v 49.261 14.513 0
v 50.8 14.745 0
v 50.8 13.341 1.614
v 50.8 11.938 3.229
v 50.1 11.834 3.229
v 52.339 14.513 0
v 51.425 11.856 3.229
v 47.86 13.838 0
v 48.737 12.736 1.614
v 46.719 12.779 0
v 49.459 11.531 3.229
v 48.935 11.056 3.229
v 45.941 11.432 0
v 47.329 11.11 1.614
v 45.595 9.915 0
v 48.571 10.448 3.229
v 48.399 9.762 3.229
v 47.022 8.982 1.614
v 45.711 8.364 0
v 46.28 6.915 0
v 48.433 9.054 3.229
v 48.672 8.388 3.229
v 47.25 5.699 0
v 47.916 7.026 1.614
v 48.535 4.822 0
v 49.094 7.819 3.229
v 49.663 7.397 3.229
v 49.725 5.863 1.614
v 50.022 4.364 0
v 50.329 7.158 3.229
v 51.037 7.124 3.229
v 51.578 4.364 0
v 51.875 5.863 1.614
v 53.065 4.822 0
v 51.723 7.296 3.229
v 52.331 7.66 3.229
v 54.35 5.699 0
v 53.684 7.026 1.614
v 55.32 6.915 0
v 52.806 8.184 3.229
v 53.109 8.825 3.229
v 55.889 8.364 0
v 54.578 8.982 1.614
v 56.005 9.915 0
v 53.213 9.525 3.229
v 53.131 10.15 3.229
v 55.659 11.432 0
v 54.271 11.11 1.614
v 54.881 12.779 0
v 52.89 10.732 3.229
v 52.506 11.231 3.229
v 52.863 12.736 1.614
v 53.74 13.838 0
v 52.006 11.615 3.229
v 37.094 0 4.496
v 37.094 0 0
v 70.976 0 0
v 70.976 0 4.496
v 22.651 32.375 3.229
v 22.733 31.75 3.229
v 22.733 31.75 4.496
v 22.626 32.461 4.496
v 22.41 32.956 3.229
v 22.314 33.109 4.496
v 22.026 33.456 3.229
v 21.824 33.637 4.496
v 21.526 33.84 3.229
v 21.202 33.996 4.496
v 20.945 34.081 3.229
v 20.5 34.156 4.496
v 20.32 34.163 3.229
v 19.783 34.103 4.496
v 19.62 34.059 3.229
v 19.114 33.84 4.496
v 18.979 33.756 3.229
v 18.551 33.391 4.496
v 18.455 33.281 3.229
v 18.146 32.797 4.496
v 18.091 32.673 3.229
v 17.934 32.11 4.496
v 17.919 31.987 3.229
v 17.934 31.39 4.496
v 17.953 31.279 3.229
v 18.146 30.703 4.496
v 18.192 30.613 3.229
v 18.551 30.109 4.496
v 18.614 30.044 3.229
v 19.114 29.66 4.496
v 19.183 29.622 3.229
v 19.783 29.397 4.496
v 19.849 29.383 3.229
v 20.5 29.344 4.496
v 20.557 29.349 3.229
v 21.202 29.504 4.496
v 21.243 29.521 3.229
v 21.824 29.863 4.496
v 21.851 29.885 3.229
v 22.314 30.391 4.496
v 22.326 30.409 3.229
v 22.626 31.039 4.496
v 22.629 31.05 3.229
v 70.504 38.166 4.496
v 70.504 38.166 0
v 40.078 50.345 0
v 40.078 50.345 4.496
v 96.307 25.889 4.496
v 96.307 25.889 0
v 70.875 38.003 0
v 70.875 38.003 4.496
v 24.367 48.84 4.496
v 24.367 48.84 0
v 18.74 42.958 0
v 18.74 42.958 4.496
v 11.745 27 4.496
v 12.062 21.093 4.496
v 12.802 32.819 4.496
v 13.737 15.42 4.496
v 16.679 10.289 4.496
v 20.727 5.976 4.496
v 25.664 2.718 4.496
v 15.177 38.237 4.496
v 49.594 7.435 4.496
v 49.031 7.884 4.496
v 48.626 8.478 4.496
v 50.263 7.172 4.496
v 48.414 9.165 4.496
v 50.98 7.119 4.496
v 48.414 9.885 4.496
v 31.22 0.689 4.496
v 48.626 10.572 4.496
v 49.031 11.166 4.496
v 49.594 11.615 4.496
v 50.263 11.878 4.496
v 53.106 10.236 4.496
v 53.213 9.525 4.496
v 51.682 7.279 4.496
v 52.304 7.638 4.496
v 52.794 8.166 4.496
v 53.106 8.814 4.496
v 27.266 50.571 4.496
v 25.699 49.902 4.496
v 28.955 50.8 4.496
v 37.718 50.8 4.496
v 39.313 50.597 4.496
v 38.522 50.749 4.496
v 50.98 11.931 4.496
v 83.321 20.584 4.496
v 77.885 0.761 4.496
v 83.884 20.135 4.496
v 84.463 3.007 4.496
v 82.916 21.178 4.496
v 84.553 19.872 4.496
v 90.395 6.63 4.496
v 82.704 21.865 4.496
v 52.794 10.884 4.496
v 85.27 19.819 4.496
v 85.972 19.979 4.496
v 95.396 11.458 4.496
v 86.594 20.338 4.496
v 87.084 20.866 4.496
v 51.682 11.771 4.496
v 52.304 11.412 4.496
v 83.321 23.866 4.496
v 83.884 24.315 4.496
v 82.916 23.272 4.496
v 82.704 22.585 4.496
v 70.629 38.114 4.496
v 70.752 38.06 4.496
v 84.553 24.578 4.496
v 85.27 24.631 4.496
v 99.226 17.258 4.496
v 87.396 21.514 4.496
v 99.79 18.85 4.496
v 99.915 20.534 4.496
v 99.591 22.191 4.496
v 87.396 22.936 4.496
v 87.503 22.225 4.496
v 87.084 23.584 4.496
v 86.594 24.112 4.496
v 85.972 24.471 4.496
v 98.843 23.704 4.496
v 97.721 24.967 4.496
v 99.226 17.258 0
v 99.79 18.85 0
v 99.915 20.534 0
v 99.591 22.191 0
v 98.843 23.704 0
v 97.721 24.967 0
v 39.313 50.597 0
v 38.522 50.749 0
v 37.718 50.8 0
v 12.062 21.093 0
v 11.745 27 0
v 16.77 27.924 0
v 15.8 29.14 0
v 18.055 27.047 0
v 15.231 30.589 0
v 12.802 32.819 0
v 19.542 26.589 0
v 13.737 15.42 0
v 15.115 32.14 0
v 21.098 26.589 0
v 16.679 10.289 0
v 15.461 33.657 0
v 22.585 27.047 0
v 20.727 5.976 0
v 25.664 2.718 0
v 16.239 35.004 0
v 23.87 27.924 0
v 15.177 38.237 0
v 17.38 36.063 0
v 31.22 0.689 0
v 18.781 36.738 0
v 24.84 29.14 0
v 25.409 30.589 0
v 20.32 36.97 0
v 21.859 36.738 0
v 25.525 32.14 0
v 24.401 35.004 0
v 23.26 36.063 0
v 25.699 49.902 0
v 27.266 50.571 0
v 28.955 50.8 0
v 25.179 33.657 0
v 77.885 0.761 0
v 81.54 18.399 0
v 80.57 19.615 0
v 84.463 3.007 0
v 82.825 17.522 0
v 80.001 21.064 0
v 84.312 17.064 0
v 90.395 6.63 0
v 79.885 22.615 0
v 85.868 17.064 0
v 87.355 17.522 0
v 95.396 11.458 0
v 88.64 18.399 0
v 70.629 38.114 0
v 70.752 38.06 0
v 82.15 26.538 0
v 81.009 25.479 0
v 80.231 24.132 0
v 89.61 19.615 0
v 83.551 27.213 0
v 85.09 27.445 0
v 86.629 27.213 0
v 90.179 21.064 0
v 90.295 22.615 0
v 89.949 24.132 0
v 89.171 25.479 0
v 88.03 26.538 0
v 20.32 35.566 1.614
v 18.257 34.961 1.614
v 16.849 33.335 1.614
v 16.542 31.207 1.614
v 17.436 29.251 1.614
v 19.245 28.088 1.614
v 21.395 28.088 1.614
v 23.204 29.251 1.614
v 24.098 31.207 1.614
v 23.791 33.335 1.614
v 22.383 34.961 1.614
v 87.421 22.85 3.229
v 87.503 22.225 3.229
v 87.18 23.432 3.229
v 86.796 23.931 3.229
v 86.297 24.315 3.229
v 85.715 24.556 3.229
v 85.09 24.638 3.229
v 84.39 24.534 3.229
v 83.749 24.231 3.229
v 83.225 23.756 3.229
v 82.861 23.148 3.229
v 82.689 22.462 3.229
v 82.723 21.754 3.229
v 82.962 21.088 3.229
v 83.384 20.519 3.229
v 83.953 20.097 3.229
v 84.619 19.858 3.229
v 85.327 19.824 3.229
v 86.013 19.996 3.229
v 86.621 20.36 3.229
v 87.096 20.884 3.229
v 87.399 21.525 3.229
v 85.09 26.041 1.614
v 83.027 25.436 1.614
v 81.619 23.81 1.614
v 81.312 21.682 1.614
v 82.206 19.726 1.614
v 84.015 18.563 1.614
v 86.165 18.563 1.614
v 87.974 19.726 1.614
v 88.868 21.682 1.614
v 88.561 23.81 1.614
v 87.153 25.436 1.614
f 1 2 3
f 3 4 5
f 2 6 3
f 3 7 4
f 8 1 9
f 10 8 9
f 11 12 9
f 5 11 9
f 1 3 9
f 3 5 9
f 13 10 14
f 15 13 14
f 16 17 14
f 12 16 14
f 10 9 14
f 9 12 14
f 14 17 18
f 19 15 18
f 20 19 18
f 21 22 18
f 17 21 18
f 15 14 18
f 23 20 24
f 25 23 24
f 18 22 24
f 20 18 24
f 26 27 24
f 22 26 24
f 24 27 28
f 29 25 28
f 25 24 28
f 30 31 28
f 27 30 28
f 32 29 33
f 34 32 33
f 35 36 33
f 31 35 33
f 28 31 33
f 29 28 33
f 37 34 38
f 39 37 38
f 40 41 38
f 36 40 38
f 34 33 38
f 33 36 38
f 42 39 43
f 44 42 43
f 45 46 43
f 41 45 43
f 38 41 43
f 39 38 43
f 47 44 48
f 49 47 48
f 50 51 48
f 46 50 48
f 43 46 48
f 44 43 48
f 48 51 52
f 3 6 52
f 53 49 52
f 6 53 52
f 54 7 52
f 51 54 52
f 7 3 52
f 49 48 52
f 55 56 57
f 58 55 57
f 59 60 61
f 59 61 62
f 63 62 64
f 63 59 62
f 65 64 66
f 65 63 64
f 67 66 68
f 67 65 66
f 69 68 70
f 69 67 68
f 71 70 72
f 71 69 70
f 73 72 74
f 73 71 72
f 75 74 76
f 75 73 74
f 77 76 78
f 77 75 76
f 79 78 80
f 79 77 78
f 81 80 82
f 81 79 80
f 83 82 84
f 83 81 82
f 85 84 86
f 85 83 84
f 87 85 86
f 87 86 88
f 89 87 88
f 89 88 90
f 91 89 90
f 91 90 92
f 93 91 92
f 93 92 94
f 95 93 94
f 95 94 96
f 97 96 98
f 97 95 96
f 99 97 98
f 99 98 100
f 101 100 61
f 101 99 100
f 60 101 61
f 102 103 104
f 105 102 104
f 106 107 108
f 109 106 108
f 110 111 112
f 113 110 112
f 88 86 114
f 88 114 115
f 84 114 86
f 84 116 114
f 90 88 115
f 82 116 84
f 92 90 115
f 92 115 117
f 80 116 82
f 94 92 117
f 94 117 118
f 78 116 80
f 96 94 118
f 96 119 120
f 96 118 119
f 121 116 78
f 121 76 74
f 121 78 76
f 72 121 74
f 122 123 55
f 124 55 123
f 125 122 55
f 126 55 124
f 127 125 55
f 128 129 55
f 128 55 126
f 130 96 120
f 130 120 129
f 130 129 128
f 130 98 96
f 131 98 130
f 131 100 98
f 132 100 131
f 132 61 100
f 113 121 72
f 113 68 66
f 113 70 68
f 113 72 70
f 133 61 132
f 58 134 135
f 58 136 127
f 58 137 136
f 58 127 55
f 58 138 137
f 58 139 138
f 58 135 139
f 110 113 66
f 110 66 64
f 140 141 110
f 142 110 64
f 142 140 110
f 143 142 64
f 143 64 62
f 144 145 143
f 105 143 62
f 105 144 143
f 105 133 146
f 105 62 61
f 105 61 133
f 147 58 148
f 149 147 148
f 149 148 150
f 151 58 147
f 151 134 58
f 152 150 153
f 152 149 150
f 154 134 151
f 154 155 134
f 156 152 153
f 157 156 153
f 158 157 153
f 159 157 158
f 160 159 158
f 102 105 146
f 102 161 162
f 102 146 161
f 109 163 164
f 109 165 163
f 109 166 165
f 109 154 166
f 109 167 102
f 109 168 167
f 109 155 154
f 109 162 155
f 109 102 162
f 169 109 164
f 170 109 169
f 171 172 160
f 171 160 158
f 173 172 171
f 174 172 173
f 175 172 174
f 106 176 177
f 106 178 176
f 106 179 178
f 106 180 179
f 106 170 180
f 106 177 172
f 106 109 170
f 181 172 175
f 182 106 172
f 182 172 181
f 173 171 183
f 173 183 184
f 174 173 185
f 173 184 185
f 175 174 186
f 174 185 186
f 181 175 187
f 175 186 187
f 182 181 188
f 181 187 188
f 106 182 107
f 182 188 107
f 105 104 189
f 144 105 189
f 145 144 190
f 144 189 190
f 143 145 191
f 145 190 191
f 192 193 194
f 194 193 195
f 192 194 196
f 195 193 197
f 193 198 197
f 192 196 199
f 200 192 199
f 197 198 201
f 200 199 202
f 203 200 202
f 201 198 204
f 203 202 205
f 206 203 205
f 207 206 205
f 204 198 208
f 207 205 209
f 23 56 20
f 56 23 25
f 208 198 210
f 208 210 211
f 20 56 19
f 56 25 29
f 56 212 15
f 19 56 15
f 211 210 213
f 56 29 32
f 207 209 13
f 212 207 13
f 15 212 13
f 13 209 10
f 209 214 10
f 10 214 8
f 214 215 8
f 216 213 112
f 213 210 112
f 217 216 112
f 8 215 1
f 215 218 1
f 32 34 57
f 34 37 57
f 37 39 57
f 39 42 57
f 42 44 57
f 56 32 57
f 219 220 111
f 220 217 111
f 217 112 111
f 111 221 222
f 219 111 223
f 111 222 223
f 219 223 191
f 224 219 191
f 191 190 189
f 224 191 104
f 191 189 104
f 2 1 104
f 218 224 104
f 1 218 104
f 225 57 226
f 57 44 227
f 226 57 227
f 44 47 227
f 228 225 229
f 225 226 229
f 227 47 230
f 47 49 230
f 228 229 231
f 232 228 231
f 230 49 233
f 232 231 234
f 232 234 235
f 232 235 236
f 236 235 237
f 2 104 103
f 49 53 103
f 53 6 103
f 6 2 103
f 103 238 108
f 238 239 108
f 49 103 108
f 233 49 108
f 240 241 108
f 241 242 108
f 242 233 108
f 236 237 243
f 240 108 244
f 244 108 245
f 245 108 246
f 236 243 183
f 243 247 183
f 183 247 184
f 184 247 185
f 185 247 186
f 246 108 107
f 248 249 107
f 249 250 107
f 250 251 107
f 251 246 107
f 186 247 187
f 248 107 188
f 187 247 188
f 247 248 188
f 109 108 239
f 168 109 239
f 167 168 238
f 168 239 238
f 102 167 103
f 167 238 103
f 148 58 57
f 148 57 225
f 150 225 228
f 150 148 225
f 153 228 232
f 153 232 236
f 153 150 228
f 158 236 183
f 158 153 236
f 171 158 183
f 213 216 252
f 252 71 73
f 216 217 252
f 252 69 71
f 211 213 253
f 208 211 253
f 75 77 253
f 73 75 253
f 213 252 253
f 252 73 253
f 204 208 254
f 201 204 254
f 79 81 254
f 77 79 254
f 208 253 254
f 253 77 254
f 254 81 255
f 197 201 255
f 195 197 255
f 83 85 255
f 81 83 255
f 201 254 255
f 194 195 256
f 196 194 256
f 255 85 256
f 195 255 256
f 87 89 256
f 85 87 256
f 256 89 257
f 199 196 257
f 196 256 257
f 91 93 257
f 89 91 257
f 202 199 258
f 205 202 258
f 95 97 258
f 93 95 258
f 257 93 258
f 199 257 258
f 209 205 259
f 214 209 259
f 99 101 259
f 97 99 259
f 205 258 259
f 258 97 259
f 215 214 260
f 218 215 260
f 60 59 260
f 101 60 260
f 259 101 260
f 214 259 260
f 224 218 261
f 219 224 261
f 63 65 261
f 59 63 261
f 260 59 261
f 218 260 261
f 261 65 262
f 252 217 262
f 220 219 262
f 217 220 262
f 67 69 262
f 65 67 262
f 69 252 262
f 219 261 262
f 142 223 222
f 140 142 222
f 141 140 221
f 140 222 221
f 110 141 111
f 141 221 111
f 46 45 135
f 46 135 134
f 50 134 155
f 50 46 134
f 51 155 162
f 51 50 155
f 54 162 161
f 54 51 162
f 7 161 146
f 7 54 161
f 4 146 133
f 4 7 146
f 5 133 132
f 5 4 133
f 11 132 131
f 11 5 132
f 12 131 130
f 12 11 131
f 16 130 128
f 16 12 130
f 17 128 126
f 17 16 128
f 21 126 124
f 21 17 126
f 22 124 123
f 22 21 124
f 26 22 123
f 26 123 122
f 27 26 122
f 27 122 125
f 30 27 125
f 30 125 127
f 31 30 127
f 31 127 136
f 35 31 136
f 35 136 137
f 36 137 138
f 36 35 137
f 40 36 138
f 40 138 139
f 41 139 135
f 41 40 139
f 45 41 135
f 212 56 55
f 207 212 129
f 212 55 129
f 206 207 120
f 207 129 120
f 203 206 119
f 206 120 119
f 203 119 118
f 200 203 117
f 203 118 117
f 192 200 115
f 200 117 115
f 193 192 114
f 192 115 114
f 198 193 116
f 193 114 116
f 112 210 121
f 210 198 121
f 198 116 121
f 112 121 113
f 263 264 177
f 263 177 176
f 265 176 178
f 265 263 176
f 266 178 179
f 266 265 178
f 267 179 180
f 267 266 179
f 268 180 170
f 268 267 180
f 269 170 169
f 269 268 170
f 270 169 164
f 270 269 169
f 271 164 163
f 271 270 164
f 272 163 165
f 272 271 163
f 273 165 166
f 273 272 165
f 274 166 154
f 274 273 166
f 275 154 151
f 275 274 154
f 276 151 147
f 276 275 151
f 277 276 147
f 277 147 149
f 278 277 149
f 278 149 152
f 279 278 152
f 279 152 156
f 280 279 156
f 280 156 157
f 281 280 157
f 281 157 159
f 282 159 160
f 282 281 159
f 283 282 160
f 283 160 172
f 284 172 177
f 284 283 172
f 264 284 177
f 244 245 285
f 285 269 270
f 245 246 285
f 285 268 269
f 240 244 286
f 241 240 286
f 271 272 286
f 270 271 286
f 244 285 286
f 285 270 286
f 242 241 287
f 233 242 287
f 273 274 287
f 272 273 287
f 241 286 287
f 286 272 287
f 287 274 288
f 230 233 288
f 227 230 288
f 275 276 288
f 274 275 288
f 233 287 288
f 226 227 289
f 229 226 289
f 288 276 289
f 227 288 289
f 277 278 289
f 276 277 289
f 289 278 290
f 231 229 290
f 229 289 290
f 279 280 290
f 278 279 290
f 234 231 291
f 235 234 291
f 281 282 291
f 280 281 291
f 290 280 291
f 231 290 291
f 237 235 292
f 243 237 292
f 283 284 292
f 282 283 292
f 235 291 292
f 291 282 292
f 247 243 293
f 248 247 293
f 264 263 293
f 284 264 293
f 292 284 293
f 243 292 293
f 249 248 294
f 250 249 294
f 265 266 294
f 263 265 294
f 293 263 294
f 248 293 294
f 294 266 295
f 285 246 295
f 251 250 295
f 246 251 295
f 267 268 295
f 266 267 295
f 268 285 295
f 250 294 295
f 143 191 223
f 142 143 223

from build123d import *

# Parameters (mm, degrees)
SKETCH1_R          = 2.413
EXTRUDE1_DEPTH     = 4.4958
CUT_EXTRUDE1_DEPTH = 114.681186736
FILLET1_R          = 6.35


with BuildPart() as part:
    # Sketch1 → Extrude1 (new body)
    with BuildSketch(Plane.XY):
        Polygon((26.2420825, 50.8), (0, 23.368), (0, 0), (101.6, 0), (101.6, 23.368), (70.6920825, 38.090460221), (38.9420825, 50.8), align=None)
        with Locations((20.32, 31.75)):
            Circle(SKETCH1_R, mode=Mode.SUBTRACT)
        with Locations((50.8, 9.525)):
            Circle(SKETCH1_R, mode=Mode.SUBTRACT)
        with Locations((85.09, 22.225)):
            Circle(SKETCH1_R, mode=Mode.SUBTRACT)
    extrude(amount=EXTRUDE1_DEPTH)

    # Sketch2 → Cut-Extrude1 (cut, through all)
    with BuildSketch(Plane.XY.offset(4.4958)):
        with BuildLine():
            Line((18.740269579, 42.958025871), (0, 23.368))
            Line((0, 23.368), (0, 0))
            Line((0, 0), (37.094444241, 0))
            ThreePointArc((37.094444241, 0), (13.737070061, 15.420367169), (18.740269579, 42.958025871))
        make_face()
        with BuildLine():
            Line((101.6, 23.368), (101.6, 0))
            Line((101.6, 0), (70.976404914, 0))
            ThreePointArc((70.976404914, 0), (90.236908542, 6.509249219), (101.6, 23.368))
        make_face()
    extrude(amount=-CUT_EXTRUDE1_DEPTH, mode=Mode.SUBTRACT)

    # Fillet1
    # the kernel refuses this fillet: 6.35 mm, written as the material it takes off along each edge
    with BuildSketch(Plane(origin=(26.2420825, 50.8, -6.782726088), x_dir=(-0.6912608610672895, -0.7226053016388058, 0), z_dir=(0, 0, 1))) as fillet1_piece_1:
        with BuildLine():
            CenterArc((FILLET1_R * 0.427258336235, FILLET1_R), FILLET1_R, 223.73, 46.27)
            Line((-FILLET1_R * 0.295346965404, FILLET1_R * 0.308739138933), (0, 0))
            Line((0, 0), (FILLET1_R * 0.427258336235, 0))
        make_face()
    extrude(amount=18.061252175, mode=Mode.SUBTRACT)
    with BuildSketch(Plane(origin=(38.9420825, 50.8, -3.059377728), x_dir=(-1, 0, 0), z_dir=(0, 0, 1))) as fillet1_piece_2:
        with BuildLine():
            CenterArc((FILLET1_R * 0.192716707281, FILLET1_R), FILLET1_R, 248.183751186, 21.816248814)
            Line((-FILLET1_R * 0.178914427547, FILLET1_R * 0.0716195286272), (0, 0))
            Line((0, 0), (FILLET1_R * 0.192716707281, 0))
        make_face()
    extrude(amount=10.614555456, mode=Mode.SUBTRACT)
    with BuildSketch(Plane(origin=(70.6920825, 38.090460221, -0.506345886), x_dir=(-0.9283804713727851, 0.3716311348281322, 0), z_dir=(0, 0, 1))) as fillet1_piece_3:
        with BuildLine():
            CenterArc((FILLET1_R * 0.0318958038441, FILLET1_R), FILLET1_R, 266.346248814, 3.653751186)
            Line((-FILLET1_R * 0.0318309718993, FILLET1_R * 0.00203261673873), (0, 0))
            Line((0, 0), (FILLET1_R * 0.0318958038441, 0))
        make_face()
    extrude(amount=5.508491772, mode=Mode.SUBTRACT)
    with BuildSketch(Plane(origin=(101.6, 23.368, -16.387317761), x_dir=(-0.9028105756982961, 0.43003844526659585, 0), z_dir=(0, 0, 1))) as fillet1_piece_4:
        with BuildLine():
            CenterArc((5.862905037, 6.35), FILLET1_R, 178.312383947, 91.687616053)
            ThreePointArc((-0.484340643, 6.537008757), (-0.411321416, 3.25597162), (0, 0))
            Line((0, 0), (5.862905037, 0))
        make_face()
    extrude(amount=37.270435521, mode=Mode.SUBTRACT)

    # Cut-Extrude2 cone 1 section (through the dimple's axis) → Cut-Extrude2 (revolve, cut)
    with BuildSketch(Plane(origin=(20.32, 31.75, 0), x_dir=(0, 1, 0), z_dir=(1, 0, 0))):
        Polygon((0, 0), (5.2197, 0), (0, 6.004577975), align=None)
    revolve(axis=Axis((20.32, 31.75, 0), (0, 0, 1)), mode=Mode.SUBTRACT)

    # Cut-Extrude2 cone 2 section (through the dimple's axis) → Cut-Extrude2 cone 2 (revolve, cut)
    with BuildSketch(Plane(origin=(50.8, 9.525, 0), x_dir=(0, 1, 0), z_dir=(1, 0, 0))):
        Polygon((0, 0), (5.2197, 0), (0, 6.004577975), align=None)
    revolve(axis=Axis((50.8, 9.525, 0), (0, 0, 1)), mode=Mode.SUBTRACT)

    # Cut-Extrude2 cone 3 section (through the dimple's axis) → Cut-Extrude2 cone 3 (revolve, cut)
    with BuildSketch(Plane(origin=(85.09, 22.225, 0), x_dir=(0, 1, 0), z_dir=(1, 0, 0))):
        Polygon((0, 0), (5.2197, 0), (0, 6.004577975), align=None)
    revolve(axis=Axis((85.09, 22.225, 0), (0, 0, 1)), mode=Mode.SUBTRACT)


solid = part.part
